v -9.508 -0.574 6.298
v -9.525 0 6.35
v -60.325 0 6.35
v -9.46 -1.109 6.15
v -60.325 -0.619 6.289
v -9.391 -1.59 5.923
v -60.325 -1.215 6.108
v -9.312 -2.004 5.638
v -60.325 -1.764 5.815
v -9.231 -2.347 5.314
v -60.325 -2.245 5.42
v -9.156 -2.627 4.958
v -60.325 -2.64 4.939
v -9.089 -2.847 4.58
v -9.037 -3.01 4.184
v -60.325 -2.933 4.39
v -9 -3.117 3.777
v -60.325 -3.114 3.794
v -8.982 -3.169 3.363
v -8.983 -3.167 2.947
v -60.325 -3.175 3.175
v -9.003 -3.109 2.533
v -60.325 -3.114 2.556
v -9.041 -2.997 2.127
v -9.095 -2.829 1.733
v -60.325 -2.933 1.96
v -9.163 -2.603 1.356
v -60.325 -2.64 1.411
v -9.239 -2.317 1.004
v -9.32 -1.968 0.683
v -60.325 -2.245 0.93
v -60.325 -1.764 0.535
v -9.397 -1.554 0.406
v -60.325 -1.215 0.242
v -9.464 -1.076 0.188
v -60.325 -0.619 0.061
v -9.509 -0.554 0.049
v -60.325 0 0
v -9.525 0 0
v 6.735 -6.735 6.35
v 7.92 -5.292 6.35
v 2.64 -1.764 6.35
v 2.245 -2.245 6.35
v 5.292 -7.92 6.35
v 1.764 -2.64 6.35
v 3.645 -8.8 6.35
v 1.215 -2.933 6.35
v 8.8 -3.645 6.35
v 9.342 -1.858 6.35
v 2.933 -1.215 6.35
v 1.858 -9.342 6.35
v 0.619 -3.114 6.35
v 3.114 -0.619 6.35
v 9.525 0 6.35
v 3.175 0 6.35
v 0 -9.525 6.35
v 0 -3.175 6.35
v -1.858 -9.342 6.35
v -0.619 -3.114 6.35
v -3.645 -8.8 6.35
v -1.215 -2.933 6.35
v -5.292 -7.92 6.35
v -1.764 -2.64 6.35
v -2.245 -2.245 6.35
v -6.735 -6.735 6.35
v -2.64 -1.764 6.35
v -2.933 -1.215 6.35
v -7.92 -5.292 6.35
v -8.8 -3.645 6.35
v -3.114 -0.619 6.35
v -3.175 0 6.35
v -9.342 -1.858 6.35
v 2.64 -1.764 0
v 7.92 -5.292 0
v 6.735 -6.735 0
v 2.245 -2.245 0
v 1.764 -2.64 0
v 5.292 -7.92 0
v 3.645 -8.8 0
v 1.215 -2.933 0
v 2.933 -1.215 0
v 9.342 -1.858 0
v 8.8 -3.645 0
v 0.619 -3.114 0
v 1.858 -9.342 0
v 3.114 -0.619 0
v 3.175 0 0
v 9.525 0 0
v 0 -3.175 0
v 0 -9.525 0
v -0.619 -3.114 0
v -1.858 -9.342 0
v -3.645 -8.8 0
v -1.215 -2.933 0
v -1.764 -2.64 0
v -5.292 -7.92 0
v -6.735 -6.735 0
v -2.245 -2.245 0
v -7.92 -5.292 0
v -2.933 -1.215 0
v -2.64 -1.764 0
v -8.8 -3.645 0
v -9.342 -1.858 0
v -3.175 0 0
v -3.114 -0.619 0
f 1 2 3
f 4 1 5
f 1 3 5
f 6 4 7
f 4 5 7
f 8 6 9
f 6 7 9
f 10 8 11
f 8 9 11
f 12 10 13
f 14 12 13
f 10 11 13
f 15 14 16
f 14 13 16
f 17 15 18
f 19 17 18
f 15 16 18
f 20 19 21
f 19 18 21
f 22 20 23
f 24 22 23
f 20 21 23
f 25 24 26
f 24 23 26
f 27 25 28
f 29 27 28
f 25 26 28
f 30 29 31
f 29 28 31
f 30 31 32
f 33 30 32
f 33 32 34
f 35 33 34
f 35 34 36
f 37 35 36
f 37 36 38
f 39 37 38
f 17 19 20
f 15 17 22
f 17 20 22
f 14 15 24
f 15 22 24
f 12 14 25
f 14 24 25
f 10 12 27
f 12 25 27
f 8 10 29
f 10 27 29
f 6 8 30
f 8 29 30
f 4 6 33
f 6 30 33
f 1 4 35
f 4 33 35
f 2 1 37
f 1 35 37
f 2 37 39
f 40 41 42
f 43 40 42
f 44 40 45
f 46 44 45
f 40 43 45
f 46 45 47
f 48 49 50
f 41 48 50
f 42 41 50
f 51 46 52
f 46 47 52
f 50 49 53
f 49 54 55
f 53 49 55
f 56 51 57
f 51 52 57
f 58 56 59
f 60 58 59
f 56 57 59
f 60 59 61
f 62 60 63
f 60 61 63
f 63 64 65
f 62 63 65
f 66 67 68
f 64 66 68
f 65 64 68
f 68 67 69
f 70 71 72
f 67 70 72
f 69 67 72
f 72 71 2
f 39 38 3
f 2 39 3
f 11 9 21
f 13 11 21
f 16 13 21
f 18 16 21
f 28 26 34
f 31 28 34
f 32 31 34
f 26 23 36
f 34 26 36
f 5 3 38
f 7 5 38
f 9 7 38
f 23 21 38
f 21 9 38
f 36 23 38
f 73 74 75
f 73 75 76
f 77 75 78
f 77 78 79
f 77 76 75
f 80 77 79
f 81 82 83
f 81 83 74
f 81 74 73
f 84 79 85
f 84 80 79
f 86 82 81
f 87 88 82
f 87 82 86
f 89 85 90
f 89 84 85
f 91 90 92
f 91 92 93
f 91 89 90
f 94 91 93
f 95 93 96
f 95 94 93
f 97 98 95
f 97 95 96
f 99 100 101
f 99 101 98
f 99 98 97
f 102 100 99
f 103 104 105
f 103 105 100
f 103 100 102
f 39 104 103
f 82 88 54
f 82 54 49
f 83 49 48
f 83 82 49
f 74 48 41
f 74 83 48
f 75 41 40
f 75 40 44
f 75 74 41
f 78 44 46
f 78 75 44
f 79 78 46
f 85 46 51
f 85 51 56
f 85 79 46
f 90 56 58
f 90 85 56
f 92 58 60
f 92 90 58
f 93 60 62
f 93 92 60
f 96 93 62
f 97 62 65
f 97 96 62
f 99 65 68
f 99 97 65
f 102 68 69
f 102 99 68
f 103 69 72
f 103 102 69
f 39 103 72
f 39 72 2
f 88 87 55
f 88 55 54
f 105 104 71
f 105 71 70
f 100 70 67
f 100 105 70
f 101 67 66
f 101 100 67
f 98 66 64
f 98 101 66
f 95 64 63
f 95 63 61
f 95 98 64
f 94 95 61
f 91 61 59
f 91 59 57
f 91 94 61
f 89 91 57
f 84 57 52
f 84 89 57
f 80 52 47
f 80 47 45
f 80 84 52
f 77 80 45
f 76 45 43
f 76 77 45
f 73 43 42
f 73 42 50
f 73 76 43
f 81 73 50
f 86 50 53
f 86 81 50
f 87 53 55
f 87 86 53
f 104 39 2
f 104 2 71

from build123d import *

# Parameters (mm, degrees)
BOSS_EXTRUDE1_DEPTH                  = 6.35
BOSS_EXTRUDE2_DEPTH                  = 50.8
BOSS_EXTRUDE2_DIRECTION_2_REACH      = 24.225
BOSS_EXTRUDE2_DIRECTION_2_END_RADIUS = 9.525


with BuildPart() as part:
    # Sketch2 → Boss-Extrude1 (new body)
    with BuildSketch(Plane.XY):
        with BuildLine():
            Line((-9.525, 0), (-3.175, 0))
            ThreePointArc((-3.175, 0), (0, -3.175), (3.175, 0))
            Line((3.175, 0), (9.525, 0))
            ThreePointArc((9.525, 0), (0, -9.525), (-9.525, 0))
        make_face()
    extrude(amount=BOSS_EXTRUDE1_DEPTH)


with BuildPart() as body_2:
    # Sketch3 → Boss-Extrude2 (new body)
    with BuildSketch(Plane.ZY.offset(9.525)):
        with BuildLine():
            Line((0, 0), (6.35, 0))
            ThreePointArc((6.35, 0), (3.175, -3.175), (0, 0))
        make_face()
    extrude(amount=BOSS_EXTRUDE2_DEPTH)

    # Boss-Extrude2 direction 2: up to this cylinder (the profile starts outside it)
    boss_extrude2_direction_2_end = Plane(origin=(0, 0, 3.175), z_dir=(0, 0, -1)) * Cylinder(BOSS_EXTRUDE2_DIRECTION_2_END_RADIUS, 68.5, mode=Mode.PRIVATE)
    # Sketch3 → Boss-Extrude2 direction 2 (add, up to the surface)
    with BuildSketch(Plane.ZY.offset(9.525), mode=Mode.PRIVATE) as boss_extrude2_direction_2_sk1:
        with BuildLine():
            Line((0, 0), (6.35, 0))
            ThreePointArc((6.35, 0), (3.175, -3.175), (0, 0))
        make_face()
    boss_extrude2_direction_2_tool1 = extrude(boss_extrude2_direction_2_sk1.sketch, amount=-BOSS_EXTRUDE2_DIRECTION_2_REACH, mode=Mode.PRIVATE) - boss_extrude2_direction_2_end
    add(boss_extrude2_direction_2_tool1.solids().sort_by_distance((-9.525, -1.347512, 3.175))[0])


solid = Compound([part.part, body_2.part])
